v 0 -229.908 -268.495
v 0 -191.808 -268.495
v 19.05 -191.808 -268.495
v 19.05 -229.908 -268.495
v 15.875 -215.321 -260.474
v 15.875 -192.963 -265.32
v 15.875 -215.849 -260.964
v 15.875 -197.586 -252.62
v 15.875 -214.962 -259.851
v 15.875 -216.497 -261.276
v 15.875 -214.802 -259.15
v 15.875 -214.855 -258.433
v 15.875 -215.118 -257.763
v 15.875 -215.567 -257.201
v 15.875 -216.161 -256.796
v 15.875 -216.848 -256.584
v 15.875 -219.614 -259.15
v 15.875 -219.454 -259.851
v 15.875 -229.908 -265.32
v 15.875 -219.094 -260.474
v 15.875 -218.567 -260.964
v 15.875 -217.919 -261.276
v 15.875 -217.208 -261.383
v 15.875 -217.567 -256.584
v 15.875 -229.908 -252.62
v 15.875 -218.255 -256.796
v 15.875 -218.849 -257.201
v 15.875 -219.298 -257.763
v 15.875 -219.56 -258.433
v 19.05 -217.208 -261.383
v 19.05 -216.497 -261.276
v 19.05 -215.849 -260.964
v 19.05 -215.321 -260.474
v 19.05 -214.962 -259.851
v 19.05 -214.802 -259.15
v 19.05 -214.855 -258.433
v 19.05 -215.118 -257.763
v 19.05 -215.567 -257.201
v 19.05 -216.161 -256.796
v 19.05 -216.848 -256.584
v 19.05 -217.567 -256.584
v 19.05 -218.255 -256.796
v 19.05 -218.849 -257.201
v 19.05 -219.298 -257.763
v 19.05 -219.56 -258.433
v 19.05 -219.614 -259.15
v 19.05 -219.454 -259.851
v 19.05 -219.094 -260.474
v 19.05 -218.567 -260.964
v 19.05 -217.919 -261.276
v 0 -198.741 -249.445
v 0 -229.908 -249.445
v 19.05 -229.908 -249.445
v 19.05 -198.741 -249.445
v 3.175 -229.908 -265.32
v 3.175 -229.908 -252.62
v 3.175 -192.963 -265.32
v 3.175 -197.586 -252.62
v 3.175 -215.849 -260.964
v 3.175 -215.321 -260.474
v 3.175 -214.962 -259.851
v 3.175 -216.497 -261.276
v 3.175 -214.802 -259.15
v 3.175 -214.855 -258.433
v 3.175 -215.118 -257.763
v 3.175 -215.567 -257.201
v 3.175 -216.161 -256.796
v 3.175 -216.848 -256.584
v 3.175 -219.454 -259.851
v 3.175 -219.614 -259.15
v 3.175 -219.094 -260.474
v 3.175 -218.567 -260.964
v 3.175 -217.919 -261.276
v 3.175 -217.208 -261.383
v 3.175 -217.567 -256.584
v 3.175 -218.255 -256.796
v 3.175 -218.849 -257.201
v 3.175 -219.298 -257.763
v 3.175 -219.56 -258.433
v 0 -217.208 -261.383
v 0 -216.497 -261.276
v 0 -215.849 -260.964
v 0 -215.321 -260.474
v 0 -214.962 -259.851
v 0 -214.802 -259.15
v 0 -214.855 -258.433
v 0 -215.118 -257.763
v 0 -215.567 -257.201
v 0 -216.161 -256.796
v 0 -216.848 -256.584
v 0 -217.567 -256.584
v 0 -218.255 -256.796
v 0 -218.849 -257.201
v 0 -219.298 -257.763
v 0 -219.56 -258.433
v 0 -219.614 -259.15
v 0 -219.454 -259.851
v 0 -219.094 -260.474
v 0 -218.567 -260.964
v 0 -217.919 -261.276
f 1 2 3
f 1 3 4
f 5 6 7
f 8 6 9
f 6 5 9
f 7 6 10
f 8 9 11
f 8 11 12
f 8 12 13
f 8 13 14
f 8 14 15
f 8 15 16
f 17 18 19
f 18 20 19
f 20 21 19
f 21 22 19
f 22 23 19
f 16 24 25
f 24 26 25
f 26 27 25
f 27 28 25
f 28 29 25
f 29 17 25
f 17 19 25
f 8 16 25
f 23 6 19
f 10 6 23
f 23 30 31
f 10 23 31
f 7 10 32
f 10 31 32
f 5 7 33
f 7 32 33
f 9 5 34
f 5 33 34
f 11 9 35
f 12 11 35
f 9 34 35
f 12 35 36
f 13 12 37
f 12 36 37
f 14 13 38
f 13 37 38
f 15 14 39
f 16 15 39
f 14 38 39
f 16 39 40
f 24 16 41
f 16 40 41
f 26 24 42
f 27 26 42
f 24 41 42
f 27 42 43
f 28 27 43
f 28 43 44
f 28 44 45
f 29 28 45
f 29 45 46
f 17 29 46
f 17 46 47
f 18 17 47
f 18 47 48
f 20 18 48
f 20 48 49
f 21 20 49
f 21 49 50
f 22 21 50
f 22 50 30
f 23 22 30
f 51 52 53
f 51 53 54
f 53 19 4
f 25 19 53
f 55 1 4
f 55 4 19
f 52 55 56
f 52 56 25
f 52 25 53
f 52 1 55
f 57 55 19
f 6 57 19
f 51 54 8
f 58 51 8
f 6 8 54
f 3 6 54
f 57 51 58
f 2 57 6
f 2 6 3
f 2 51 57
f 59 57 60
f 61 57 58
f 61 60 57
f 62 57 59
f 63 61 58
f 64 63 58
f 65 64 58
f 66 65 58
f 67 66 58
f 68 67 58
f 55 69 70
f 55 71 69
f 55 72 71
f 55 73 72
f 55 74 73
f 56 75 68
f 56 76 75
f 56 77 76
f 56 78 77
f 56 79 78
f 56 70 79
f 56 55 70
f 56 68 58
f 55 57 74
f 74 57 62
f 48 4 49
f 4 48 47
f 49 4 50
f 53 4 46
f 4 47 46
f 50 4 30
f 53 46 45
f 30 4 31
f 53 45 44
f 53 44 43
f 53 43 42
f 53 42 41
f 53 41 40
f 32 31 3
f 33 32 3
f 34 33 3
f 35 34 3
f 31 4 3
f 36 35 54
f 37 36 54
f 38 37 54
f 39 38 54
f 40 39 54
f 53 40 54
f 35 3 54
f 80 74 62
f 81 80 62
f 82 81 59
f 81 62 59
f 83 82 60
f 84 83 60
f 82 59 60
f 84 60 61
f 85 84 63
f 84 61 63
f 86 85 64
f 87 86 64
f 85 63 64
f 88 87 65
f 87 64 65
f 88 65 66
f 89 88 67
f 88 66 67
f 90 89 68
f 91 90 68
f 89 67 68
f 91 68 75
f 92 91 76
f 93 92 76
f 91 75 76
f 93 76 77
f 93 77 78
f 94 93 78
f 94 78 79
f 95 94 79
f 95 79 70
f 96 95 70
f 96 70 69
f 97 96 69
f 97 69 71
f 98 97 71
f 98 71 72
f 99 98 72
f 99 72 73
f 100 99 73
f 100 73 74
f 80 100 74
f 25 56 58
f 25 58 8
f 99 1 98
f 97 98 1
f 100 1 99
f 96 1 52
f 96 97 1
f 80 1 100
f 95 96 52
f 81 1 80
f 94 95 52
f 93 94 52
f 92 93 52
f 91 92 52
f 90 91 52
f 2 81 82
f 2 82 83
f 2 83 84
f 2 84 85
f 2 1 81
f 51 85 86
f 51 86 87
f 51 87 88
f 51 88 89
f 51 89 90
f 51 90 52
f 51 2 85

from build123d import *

# Parameters (mm, degrees)
BOSS_EXTRUDE1_DEPTH = 19.05
SKETCH2_W           = 12.7
SKETCH2_H           = 12.7
CUT_EXTRUDE1_DEPTH  = 272.852903886
SKETCH3_R           = 2.413
CUT_EXTRUDE2_DEPTH  = 354.991519469


with BuildPart() as part:
    # Sketch1 → Boss-Extrude1 (new body)
    with BuildSketch(Plane(origin=(0, 0, 0), x_dir=(0, 0, -1), z_dir=(1, 0, 0))):
        Polygon((268.494858146, -191.807817407), (268.494858146, -229.907817407), (249.444858146, -229.907817407), (249.444858146, -198.74145037), align=None)
    extrude(amount=BOSS_EXTRUDE1_DEPTH)

    # Sketch2 → Cut-Extrude1 (cut, through all)
    with BuildSketch(Plane.XZ.offset(229.907817407)):
        with Locations((9.525, -258.969858146)):
            Rectangle(SKETCH2_W, SKETCH2_H)
    extrude(amount=-CUT_EXTRUDE1_DEPTH, mode=Mode.SUBTRACT)

    # Sketch3 → Cut-Extrude2 (cut, through all)
    with BuildSketch(Plane(origin=(19.05, 0, 0), x_dir=(0, 0, -1), z_dir=(1, 0, 0))):
        with Locations((258.969858146, -217.207817407)):
            Circle(SKETCH3_R)
    extrude(amount=-CUT_EXTRUDE2_DEPTH, mode=Mode.SUBTRACT)


solid = part.part
